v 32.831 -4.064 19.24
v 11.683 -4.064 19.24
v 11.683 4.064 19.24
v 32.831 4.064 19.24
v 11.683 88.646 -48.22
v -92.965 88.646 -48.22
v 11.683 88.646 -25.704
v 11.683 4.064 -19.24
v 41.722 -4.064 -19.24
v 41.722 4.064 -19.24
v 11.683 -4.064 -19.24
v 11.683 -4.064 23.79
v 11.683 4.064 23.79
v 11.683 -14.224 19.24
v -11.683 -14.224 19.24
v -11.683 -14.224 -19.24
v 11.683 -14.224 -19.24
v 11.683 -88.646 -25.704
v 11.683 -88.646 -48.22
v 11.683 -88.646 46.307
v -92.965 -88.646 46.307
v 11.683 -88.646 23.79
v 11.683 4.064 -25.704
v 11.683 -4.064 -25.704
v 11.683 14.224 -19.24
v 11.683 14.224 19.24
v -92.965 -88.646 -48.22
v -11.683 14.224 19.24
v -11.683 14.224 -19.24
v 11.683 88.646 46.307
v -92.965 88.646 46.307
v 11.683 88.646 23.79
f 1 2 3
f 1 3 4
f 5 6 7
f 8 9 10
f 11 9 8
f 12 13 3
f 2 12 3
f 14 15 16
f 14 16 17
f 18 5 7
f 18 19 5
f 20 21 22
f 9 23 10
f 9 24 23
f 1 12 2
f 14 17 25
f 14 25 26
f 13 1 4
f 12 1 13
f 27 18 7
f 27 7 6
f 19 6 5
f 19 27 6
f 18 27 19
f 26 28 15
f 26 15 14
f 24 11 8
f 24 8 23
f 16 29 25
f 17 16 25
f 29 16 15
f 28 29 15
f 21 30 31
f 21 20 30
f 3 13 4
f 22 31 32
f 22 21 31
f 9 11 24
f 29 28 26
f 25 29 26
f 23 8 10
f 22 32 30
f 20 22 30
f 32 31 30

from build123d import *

# Parameters (mm, degrees)
F0_W     = 23.3653002378
F0_H     = 38.4804269521
F1_DEPTH = 14.224
F2_DEPTH = 88.646
F3_DEPTH = 4.064


with BuildPart() as f1:
    # F0 (on Front) → F1 (new body, symmetric)
    with BuildSketch(Plane.XZ):
        Rectangle(F0_W, F0_H)
    extrude(amount=F1_DEPTH, both=True)


with BuildPart() as f2:
    # F0 (on Front) → F2 (new body, symmetric)
    with BuildSketch(Plane.XZ):
        Polygon((11.6826501189, -48.2201610969), (11.6826501189, -25.7036866204), (-92.9653498811, -48.2201610969), align=None)
    extrude(amount=F2_DEPTH, both=True)


with BuildPart() as f2b:
    # F0 (on Front) → F2, piece 2 (new body, symmetric)
    with BuildSketch(Plane.XZ):
        Polygon((-92.9653498811, 46.3066697121), (11.6826501189, 23.7904659811), (11.6826501189, 46.3066697121), align=None)
    extrude(amount=F2_DEPTH, both=True)


with BuildPart() as f3:
    # F0 (on Front) → F3 (new body, symmetric)
    with BuildSketch(Plane.XZ):
        Polygon((41.7224122633, -19.240213476), (11.6826501189, -19.240213476), (11.6826501189, -25.7036866204), align=None)
    extrude(amount=F3_DEPTH, both=True)


with BuildPart() as f3b:
    # F0 (on Front) → F3, piece 2 (new body, symmetric)
    with BuildSketch(Plane.XZ):
        Polygon((11.6826501189, 23.7904659811), (11.6826501189, 19.240213476), (32.8307455013, 19.240213476), align=None)
    extrude(amount=F3_DEPTH, both=True)


solid = Compound([f1.part, f2.part, f2b.part, f3.part, f3b.part])
